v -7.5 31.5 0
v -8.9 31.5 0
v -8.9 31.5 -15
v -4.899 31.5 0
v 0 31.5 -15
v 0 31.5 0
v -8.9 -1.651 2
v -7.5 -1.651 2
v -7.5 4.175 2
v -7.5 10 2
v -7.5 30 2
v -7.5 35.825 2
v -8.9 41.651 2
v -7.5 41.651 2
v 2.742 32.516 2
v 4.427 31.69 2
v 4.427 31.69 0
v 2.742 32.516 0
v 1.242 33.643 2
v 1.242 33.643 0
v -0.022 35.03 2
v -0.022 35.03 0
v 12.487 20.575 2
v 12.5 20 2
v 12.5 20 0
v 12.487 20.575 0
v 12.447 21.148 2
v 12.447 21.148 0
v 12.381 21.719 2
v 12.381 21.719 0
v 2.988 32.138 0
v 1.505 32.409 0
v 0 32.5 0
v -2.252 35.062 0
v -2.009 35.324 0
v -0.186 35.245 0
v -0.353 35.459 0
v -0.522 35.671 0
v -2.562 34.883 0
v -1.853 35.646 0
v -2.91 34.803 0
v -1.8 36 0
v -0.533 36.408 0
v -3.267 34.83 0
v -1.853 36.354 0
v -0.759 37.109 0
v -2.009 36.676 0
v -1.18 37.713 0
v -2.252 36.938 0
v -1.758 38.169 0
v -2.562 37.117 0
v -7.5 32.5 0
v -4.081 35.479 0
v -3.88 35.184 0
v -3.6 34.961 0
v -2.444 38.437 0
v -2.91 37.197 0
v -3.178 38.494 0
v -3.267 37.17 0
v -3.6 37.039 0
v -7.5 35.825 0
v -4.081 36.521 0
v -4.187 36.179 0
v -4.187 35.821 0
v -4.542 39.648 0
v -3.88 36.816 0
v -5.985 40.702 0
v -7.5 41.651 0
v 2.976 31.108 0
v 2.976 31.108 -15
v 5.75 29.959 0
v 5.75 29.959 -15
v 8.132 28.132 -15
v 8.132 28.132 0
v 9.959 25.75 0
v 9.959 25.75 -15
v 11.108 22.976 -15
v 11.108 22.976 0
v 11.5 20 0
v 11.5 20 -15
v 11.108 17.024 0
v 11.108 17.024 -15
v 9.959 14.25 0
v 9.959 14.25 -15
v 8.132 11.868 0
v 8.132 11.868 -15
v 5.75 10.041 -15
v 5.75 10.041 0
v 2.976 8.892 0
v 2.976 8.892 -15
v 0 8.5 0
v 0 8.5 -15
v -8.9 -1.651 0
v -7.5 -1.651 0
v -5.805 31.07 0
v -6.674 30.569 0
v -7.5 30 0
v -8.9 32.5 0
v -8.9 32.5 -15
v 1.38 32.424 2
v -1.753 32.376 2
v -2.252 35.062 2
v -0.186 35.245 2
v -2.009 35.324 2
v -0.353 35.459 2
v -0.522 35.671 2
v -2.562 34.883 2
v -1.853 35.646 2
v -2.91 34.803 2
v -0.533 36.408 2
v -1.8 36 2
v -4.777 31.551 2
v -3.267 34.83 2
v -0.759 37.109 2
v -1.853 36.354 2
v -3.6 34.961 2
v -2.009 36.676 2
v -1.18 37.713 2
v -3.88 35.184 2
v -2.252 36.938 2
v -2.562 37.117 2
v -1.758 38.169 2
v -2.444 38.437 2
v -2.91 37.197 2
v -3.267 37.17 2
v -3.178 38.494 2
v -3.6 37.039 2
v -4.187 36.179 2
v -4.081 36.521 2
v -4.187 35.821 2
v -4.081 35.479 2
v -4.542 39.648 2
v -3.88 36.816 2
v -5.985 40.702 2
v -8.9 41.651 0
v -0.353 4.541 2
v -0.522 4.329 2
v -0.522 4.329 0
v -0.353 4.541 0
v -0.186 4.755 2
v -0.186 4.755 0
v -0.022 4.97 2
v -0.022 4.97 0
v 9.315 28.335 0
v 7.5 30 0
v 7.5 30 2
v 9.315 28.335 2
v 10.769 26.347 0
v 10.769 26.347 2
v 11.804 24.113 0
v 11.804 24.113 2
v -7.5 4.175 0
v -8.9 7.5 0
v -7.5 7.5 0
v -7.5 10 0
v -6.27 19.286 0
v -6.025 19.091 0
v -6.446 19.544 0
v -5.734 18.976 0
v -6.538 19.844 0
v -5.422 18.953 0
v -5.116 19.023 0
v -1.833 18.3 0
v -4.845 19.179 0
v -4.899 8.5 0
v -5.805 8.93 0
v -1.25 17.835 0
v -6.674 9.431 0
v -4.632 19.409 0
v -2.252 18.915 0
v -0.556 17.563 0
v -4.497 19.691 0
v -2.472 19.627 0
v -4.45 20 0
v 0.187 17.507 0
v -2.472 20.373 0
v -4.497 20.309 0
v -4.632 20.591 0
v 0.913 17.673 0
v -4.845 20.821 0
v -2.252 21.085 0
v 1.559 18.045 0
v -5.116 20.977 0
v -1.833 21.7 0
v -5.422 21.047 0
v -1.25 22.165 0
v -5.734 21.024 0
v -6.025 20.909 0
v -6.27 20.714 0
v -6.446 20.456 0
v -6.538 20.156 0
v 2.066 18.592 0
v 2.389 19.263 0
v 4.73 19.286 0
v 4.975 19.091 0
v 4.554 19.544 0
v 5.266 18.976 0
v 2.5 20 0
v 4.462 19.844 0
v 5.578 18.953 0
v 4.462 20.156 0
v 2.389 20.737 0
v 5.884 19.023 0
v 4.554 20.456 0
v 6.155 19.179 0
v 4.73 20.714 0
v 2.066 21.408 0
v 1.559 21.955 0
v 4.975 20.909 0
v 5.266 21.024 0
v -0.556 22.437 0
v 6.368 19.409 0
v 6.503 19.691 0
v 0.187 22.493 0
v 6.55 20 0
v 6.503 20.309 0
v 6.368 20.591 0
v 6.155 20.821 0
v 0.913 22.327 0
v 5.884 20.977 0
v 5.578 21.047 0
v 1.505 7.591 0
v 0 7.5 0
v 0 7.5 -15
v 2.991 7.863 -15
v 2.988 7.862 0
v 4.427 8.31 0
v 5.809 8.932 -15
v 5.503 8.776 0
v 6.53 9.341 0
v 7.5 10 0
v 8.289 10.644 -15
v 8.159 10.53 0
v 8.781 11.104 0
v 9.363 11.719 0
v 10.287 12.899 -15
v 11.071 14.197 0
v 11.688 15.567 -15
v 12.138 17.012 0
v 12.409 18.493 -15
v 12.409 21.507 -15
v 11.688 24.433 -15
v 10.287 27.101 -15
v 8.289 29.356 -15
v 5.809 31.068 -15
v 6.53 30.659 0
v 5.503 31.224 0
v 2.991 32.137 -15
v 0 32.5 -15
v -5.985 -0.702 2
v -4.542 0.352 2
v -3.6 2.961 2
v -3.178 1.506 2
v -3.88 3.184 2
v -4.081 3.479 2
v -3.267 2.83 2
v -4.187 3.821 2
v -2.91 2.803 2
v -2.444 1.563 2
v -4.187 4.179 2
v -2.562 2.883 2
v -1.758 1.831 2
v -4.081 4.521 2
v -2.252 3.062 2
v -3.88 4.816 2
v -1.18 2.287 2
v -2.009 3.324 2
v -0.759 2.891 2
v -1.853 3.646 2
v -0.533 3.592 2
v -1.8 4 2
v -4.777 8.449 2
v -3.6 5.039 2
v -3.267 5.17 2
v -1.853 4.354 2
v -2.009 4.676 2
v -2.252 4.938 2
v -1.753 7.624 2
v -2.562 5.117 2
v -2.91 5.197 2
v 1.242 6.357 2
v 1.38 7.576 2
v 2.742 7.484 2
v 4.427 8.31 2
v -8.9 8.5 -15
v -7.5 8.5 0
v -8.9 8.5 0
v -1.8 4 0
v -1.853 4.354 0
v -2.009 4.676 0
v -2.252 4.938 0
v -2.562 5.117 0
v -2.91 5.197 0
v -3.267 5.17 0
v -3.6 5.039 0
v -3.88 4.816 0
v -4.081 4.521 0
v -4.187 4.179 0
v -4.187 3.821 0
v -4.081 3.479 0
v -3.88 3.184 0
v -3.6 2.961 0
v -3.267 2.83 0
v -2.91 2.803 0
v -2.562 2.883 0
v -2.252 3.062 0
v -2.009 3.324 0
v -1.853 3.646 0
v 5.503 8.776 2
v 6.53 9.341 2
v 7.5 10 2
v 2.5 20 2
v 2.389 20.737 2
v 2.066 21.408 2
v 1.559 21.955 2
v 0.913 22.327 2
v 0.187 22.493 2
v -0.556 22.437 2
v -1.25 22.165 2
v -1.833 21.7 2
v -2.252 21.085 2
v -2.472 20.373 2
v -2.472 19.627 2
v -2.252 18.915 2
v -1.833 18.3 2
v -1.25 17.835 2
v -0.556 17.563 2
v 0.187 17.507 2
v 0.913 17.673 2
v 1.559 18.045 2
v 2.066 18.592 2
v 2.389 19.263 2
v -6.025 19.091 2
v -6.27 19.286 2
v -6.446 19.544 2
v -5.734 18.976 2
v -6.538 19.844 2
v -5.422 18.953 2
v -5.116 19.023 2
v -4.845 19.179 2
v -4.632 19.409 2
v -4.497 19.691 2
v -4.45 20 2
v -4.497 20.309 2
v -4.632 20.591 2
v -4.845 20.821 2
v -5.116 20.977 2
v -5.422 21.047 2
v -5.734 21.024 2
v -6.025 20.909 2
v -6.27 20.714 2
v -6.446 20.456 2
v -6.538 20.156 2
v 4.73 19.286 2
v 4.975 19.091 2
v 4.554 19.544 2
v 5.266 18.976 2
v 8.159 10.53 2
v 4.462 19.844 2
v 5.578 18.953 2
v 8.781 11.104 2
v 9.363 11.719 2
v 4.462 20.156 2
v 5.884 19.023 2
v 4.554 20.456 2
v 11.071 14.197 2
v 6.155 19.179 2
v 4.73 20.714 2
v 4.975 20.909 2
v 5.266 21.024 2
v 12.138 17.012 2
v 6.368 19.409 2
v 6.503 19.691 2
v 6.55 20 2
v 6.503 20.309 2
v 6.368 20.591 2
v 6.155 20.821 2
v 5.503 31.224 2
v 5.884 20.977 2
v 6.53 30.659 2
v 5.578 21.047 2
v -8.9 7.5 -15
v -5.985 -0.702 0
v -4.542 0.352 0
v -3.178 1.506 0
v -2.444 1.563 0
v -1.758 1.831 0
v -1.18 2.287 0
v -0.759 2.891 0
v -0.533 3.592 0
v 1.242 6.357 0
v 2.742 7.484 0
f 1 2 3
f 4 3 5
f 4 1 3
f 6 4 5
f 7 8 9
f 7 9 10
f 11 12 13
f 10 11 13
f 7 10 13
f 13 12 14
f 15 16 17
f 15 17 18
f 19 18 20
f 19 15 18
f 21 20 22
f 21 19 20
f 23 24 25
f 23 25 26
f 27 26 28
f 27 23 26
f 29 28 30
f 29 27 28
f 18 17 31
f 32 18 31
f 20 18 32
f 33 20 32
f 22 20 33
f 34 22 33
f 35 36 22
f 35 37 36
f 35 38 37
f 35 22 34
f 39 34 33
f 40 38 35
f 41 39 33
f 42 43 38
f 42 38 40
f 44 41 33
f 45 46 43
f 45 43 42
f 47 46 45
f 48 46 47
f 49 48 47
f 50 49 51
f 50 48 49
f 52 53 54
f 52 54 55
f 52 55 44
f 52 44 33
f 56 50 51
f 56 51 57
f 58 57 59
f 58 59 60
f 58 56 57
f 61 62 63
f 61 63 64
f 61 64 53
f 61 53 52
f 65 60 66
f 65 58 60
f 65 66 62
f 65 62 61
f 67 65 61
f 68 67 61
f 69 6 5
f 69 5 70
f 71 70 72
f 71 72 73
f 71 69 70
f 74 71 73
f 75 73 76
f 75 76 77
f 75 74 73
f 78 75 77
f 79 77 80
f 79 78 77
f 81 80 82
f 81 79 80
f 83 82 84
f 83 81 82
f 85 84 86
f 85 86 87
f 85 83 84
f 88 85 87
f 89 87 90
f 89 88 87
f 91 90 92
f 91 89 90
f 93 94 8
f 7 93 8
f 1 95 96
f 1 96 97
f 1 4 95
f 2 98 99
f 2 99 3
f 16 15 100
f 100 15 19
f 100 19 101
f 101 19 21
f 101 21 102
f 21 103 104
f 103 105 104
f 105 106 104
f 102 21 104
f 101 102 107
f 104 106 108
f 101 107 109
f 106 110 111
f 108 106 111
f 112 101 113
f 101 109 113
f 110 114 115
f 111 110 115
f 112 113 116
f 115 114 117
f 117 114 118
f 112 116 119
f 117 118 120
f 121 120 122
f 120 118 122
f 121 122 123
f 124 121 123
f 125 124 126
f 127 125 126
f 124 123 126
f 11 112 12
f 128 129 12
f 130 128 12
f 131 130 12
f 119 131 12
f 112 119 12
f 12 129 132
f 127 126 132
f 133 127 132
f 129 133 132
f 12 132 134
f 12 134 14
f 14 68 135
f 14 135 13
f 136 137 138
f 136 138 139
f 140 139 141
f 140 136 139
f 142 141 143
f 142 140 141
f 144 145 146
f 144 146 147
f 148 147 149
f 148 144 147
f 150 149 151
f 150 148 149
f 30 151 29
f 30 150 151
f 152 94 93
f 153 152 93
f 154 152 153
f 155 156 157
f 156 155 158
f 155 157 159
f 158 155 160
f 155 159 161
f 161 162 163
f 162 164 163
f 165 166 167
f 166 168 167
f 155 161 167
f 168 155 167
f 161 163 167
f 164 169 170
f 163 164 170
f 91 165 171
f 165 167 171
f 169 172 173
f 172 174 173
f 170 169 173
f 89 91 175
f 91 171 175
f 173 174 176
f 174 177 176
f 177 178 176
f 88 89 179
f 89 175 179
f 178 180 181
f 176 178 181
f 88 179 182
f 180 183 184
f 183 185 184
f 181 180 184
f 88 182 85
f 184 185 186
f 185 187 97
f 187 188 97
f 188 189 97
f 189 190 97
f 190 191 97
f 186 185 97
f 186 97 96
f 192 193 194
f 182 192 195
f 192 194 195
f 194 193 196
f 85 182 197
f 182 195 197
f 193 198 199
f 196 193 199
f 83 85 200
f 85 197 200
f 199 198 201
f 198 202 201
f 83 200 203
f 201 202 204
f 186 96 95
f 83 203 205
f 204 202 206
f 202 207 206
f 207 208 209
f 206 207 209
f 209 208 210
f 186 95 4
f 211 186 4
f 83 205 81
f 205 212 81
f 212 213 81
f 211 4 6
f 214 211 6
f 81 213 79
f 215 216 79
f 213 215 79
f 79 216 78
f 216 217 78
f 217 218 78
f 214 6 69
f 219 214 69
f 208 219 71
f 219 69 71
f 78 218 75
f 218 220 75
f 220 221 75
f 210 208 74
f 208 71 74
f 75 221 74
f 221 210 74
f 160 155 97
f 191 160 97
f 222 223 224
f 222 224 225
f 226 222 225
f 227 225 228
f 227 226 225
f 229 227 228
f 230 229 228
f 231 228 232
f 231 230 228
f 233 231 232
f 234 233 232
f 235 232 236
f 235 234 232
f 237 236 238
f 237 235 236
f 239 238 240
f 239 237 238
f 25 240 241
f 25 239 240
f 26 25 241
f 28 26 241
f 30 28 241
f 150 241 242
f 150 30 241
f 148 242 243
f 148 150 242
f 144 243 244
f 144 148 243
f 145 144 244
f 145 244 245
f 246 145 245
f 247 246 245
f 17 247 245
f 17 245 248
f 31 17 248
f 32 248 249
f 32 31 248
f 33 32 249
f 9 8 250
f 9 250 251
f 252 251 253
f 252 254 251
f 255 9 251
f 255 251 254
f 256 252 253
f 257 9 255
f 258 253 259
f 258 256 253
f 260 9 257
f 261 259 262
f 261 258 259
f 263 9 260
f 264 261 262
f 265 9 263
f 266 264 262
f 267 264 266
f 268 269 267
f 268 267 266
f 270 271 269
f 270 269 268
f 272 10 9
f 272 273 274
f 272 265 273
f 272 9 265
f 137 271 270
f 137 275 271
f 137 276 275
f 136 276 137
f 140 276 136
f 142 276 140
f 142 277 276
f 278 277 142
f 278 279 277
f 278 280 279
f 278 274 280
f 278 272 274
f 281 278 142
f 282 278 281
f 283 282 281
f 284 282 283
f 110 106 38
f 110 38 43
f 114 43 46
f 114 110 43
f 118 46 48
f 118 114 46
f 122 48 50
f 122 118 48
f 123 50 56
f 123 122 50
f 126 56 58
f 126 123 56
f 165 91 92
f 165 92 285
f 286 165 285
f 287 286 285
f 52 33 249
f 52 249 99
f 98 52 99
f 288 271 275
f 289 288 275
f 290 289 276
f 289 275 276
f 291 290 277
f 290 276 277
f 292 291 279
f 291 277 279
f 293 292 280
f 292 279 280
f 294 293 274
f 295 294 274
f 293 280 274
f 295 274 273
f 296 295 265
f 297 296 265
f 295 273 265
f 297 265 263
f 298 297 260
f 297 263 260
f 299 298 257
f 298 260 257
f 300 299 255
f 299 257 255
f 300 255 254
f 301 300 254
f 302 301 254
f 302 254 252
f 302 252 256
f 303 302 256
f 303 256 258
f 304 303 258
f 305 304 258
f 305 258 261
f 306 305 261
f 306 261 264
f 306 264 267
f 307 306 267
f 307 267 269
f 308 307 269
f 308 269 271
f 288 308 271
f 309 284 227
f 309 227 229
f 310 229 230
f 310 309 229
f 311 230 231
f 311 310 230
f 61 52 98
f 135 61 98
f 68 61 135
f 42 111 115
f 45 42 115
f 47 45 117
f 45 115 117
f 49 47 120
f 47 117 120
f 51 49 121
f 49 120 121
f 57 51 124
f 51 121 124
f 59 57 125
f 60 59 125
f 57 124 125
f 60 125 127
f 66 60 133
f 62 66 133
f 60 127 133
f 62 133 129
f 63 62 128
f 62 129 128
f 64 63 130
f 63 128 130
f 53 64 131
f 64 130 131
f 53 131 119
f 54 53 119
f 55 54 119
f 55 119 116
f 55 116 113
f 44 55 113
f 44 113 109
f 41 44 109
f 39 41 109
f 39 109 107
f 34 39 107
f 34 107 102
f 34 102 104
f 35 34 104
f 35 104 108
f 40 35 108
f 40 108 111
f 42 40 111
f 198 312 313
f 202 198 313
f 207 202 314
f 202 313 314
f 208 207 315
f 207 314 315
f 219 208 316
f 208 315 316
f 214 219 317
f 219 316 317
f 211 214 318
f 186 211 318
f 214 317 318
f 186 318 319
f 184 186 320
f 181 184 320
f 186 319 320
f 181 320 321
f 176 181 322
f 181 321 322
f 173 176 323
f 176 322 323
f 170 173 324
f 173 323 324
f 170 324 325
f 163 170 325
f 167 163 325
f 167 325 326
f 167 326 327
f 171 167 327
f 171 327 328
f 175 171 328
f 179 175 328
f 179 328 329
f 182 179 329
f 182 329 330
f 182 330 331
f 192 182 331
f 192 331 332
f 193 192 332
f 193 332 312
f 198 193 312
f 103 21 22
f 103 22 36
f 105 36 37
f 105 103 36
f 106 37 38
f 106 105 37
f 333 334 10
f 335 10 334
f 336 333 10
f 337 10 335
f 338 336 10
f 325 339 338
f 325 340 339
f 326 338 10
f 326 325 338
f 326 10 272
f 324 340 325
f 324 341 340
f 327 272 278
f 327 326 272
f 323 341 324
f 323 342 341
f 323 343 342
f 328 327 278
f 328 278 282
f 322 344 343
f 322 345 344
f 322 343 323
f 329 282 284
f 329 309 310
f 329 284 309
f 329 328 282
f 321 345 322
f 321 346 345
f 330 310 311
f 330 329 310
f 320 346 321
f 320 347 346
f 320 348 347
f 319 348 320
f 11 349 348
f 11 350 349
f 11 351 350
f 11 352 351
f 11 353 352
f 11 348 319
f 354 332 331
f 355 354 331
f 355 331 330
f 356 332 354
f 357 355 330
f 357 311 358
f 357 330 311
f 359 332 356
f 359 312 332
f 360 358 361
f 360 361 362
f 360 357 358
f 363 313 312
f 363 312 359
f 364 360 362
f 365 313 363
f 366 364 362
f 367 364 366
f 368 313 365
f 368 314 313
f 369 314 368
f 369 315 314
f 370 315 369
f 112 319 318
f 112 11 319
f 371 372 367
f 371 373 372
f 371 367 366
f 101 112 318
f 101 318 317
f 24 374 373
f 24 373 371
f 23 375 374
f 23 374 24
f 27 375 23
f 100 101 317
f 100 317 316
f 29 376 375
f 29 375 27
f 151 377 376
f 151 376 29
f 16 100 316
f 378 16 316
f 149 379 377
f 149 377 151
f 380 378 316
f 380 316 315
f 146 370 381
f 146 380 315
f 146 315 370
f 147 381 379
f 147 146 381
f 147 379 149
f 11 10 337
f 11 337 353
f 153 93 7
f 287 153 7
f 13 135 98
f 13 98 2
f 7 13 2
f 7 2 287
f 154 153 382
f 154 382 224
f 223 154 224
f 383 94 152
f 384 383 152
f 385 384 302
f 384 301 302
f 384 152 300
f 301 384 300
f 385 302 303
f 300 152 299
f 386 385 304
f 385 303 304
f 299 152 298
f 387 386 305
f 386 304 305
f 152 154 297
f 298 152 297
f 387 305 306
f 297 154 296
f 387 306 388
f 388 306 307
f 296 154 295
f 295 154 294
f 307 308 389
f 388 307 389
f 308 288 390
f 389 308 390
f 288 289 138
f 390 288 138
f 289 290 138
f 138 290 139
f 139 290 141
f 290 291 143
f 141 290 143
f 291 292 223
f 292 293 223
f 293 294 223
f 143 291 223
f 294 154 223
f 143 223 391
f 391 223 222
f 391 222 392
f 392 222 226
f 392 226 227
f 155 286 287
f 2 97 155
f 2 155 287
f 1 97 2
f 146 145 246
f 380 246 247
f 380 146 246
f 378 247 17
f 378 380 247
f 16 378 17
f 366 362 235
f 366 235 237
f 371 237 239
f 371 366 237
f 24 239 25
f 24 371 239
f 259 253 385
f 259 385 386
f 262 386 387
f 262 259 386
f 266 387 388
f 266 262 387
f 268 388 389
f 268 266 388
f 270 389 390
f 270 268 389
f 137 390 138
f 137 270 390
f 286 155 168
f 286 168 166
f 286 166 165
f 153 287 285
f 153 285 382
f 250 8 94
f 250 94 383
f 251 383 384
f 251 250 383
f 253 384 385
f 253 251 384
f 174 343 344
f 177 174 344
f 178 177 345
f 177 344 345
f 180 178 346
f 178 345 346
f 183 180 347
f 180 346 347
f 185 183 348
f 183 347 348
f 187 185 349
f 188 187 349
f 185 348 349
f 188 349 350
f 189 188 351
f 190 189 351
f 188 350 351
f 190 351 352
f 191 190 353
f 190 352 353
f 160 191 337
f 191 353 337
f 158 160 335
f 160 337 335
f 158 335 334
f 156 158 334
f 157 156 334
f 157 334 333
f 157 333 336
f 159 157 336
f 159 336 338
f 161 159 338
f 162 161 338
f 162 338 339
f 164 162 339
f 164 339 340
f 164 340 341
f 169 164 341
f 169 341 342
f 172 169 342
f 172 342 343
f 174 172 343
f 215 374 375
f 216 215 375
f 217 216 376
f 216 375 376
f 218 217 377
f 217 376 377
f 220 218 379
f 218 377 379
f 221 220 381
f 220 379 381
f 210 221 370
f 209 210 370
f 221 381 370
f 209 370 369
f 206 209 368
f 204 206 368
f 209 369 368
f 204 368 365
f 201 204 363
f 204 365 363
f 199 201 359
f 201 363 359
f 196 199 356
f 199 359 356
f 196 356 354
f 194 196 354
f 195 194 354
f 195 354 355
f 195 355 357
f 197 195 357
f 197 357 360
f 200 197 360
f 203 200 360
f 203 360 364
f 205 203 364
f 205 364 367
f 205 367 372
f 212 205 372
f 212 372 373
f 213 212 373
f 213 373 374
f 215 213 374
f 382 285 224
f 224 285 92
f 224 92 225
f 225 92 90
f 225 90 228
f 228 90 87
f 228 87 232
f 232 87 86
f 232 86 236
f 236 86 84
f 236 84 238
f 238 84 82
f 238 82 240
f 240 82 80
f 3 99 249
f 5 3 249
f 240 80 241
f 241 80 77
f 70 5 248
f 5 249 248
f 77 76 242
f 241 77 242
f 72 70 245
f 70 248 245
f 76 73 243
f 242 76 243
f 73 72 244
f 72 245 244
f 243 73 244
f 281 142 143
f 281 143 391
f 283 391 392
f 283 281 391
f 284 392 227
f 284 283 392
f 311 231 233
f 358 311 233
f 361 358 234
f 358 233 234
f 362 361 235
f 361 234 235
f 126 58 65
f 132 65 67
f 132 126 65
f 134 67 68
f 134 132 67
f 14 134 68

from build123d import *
from build123d.topology import SkipClean

# Parameters (mm, degrees)
EXTRUDE_1_DEPTH     = 2
SKETCH_2_R          = 2.5
SKETCH_2_R_2        = 1.05
CUT_EXTRUDE_1_DEPTH = 5
SKETCH_4_R          = 1.1
CUT_EXTRUDE_2_DEPTH = 2
EXTRUDE_START       = -2
EXTRUDE_2_DEPTH     = 2
SKETCH_6_OUTSIDE_W  = 57.136
SKETCH_6_OUTSIDE_H  = 39.994
SKETCH_6_OUTSIDE_R  = 12.5
CUT_EXTRUDE_3_DEPTH = 10
EXTRUDE_3_DEPTH     = 2
SKETCH_8_R          = 1.2
CUT_EXTRUDE_4_DEPTH = 10
SKETCH_9_OUTSIDE_W  = 38.188
SKETCH_9_OUTSIDE_H  = 63.188
CUT_EXTRUDE_5_DEPTH = 14
CUT_EXTRUDE_6_DEPTH = 10
SKETCH_11_W         = 2
SKETCH_11_H         = 43.30127019
EXTRUDE_4_DEPTH     = 1.4
EXTRUDE_1_2_DEPTH   = 15


with BuildPart() as part:
    # 草图1 → Extrude 1 (new body)
    with BuildSketch(Plane.XY):
        with BuildLine():
            ThreePointArc((21.650635095, 12.5), (0, 25), (-21.650635095, 12.5))
            ThreePointArc((-21.650635095, 12.5), (-19.820508076, 5.669872981), (-12.990381057, 7.5))
            ThreePointArc((-12.990381057, 7.5), (0, 15), (12.990381057, 7.5))
            ThreePointArc((12.990381057, 7.5), (19.820508076, 5.669872981), (21.650635095, 12.5))
        make_face()
    extrude(amount=EXTRUDE_1_DEPTH)

    # 草图2 → 切除-拉伸1 (cut)
    with BuildSketch(Plane.XY.offset(2)):
        with Locations((0, 20)):
            Circle(SKETCH_2_R)
        with Locations((-5.5, 20)):
            Circle(SKETCH_2_R_2)
        with Locations((5.5, 20)):
            Circle(SKETCH_2_R_2)
    extrude(amount=-CUT_EXTRUDE_1_DEPTH, mode=Mode.SUBTRACT)

    # 草图4 → 切除-拉伸2 (cut)
    with BuildSketch(Plane.XY.offset(2)):
        with Locations((-17.320508076, 10)):
            Circle(SKETCH_4_R)
        with Locations((17.320508076, 10)):
            Circle(SKETCH_4_R)
    extrude(amount=-CUT_EXTRUDE_2_DEPTH, mode=Mode.SUBTRACT)

    # 草图5 → 凸台-拉伸2 (add)
    with BuildSketch(Plane.XY.offset(2).offset(EXTRUDE_START)):
        with BuildLine():
            ThreePointArc((-9.363273917, 11.71875), (0, 7.5), (9.363273917, 11.71875))
            ThreePointArc((9.363273917, 11.71875), (0, 15), (-9.363273917, 11.71875))
        make_face()
        with BuildLine():
            ThreePointArc((12.381272085, 21.71875), (0, 25), (-12.381272085, 21.71875))
            ThreePointArc((-12.381272085, 21.71875), (0, 32.5), (12.381272085, 21.71875))
        make_face()
    extrude(amount=EXTRUDE_2_DEPTH)

    # 草图6 outside → 切除-拉伸3 (cut)
    with SkipClean():  # the faces are left unmerged after this step: merging them gives an invalid solid
        with BuildSketch(Plane.XY.offset(2)):
            with Locations((0, 18.75)):
                Rectangle(SKETCH_6_OUTSIDE_W, SKETCH_6_OUTSIDE_H)
            with Locations((0, 20)):
                Circle(SKETCH_6_OUTSIDE_R, mode=Mode.SUBTRACT)
        extrude(amount=-CUT_EXTRUDE_3_DEPTH, mode=Mode.SUBTRACT)

    # 草图7 → 凸台-拉伸3 (add)
    with SkipClean():  # the faces are left unmerged after this step: merging them gives an invalid solid
        with BuildSketch(Plane.XY.offset(2)):
            with BuildLine():
                Line((-7.5, 10), (-7.5, -5))
                Line((-7.5, -5), (7.5, -5))
                Line((7.5, -5), (7.5, 10))
                ThreePointArc((7.5, 10), (0, 7.5), (-7.5, 10))
            make_face()
            with BuildLine():
                Line((-7.5, 45), (7.5, 45))
                Line((7.5, 45), (7.5, 30))
                ThreePointArc((7.5, 30), (0, 32.5), (-7.5, 30))
                Line((-7.5, 30), (-7.5, 45))
            make_face()
        extrude(amount=-EXTRUDE_3_DEPTH)

    # 草图8 → 切除-拉伸4 (cut)
    with SkipClean():  # the faces are left unmerged after this step: merging them gives an invalid solid
        with BuildSketch(Plane.XY.offset(2)):
            with Locations((-3, 4)):
                Circle(SKETCH_8_R)
            with Locations((-3, 36)):
                Circle(SKETCH_8_R)
        extrude(amount=-CUT_EXTRUDE_4_DEPTH, mode=Mode.SUBTRACT)

    # 草图9 outside → 切除-拉伸5 (cut)
    with SkipClean():  # the faces are left unmerged after this step: merging them gives an invalid solid
        with BuildSketch(Plane.XY.offset(2)):
            with Locations((0, 20)):
                Rectangle(SKETCH_9_OUTSIDE_W, SKETCH_9_OUTSIDE_H)
            with BuildLine():
                ThreePointArc((4.427083333, 8.310220996), (12.5, 20), (4.427083333, 31.689779004))
                ThreePointArc((4.427083333, 31.689779004), (1.965433704, 33.044090503), (-0.022321429, 35.029715862))
                ThreePointArc((-0.022321429, 35.029715862), (-0.269391354, 35.352624611), (-0.52168006, 35.671472564))
                ThreePointArc((-0.52168006, 35.671472564), (-1.179500018, 37.713411748), (-3.177861224, 38.493665051))
                ThreePointArc((-3.177861224, 38.493665051), (-45, 20), (-3.177861224, 1.506334949))
                ThreePointArc((-3.177861224, 1.506334949), (-1.179500018, 2.286588252), (-0.52168006, 4.328527436))
                ThreePointArc((-0.52168006, 4.328527436), (-0.269391354, 4.647375389), (-0.022321429, 4.970284138))
                ThreePointArc((-0.022321429, 4.970284138), (1.965433704, 6.955909497), (4.427083333, 8.310220996))
            make_face(mode=Mode.SUBTRACT)
        extrude(amount=-CUT_EXTRUDE_5_DEPTH, mode=Mode.SUBTRACT)

    # 草图10 → 切除-拉伸6 (cut)
    with SkipClean():  # the faces are left unmerged after this step: merging them gives an invalid solid
        with BuildSketch(Plane(origin=(0, 0, 0), x_dir=(-1, 0, 0), z_dir=(0, 0, -1))):
            Polygon((7.5, 35.825317547), (7.5, 4.174682453), (36.824100737, 12.604038964), align=None)
        extrude(amount=-CUT_EXTRUDE_6_DEPTH, mode=Mode.SUBTRACT)

    # 草图11 → 凸台-拉伸4 (add)
    with SkipClean():  # the faces are left unmerged after this step: merging them gives an invalid solid
        with BuildSketch(Plane.ZY.offset(7.5)):
            with Locations((1, 20)):
                Rectangle(SKETCH_11_W, SKETCH_11_H)
        extrude(amount=EXTRUDE_4_DEPTH)

    # 草图12 → Extrude 1 2 (add)
    with SkipClean():  # the faces are left unmerged after this step: merging them gives an invalid solid
        with BuildSketch(Plane(origin=(0, 0, 0), x_dir=(-1, 0, 0), z_dir=(0, 0, -1))):
            with BuildLine():
                Line((8.9, 7.5), (0, 7.5))
                ThreePointArc((0, 7.5), (-12.5, 20), (0, 32.5))
                Line((0, 32.5), (8.9, 32.5))
                Line((8.9, 32.5), (8.9, 31.5))
                Line((8.9, 31.5), (0, 31.5))
                ThreePointArc((0, 31.5), (-11.5, 20), (0, 8.5))
                Line((0, 8.5), (8.9, 8.5))
                Line((8.9, 8.5), (8.9, 7.5))
            make_face()
        extrude(amount=EXTRUDE_1_2_DEPTH)


solid = part.part
